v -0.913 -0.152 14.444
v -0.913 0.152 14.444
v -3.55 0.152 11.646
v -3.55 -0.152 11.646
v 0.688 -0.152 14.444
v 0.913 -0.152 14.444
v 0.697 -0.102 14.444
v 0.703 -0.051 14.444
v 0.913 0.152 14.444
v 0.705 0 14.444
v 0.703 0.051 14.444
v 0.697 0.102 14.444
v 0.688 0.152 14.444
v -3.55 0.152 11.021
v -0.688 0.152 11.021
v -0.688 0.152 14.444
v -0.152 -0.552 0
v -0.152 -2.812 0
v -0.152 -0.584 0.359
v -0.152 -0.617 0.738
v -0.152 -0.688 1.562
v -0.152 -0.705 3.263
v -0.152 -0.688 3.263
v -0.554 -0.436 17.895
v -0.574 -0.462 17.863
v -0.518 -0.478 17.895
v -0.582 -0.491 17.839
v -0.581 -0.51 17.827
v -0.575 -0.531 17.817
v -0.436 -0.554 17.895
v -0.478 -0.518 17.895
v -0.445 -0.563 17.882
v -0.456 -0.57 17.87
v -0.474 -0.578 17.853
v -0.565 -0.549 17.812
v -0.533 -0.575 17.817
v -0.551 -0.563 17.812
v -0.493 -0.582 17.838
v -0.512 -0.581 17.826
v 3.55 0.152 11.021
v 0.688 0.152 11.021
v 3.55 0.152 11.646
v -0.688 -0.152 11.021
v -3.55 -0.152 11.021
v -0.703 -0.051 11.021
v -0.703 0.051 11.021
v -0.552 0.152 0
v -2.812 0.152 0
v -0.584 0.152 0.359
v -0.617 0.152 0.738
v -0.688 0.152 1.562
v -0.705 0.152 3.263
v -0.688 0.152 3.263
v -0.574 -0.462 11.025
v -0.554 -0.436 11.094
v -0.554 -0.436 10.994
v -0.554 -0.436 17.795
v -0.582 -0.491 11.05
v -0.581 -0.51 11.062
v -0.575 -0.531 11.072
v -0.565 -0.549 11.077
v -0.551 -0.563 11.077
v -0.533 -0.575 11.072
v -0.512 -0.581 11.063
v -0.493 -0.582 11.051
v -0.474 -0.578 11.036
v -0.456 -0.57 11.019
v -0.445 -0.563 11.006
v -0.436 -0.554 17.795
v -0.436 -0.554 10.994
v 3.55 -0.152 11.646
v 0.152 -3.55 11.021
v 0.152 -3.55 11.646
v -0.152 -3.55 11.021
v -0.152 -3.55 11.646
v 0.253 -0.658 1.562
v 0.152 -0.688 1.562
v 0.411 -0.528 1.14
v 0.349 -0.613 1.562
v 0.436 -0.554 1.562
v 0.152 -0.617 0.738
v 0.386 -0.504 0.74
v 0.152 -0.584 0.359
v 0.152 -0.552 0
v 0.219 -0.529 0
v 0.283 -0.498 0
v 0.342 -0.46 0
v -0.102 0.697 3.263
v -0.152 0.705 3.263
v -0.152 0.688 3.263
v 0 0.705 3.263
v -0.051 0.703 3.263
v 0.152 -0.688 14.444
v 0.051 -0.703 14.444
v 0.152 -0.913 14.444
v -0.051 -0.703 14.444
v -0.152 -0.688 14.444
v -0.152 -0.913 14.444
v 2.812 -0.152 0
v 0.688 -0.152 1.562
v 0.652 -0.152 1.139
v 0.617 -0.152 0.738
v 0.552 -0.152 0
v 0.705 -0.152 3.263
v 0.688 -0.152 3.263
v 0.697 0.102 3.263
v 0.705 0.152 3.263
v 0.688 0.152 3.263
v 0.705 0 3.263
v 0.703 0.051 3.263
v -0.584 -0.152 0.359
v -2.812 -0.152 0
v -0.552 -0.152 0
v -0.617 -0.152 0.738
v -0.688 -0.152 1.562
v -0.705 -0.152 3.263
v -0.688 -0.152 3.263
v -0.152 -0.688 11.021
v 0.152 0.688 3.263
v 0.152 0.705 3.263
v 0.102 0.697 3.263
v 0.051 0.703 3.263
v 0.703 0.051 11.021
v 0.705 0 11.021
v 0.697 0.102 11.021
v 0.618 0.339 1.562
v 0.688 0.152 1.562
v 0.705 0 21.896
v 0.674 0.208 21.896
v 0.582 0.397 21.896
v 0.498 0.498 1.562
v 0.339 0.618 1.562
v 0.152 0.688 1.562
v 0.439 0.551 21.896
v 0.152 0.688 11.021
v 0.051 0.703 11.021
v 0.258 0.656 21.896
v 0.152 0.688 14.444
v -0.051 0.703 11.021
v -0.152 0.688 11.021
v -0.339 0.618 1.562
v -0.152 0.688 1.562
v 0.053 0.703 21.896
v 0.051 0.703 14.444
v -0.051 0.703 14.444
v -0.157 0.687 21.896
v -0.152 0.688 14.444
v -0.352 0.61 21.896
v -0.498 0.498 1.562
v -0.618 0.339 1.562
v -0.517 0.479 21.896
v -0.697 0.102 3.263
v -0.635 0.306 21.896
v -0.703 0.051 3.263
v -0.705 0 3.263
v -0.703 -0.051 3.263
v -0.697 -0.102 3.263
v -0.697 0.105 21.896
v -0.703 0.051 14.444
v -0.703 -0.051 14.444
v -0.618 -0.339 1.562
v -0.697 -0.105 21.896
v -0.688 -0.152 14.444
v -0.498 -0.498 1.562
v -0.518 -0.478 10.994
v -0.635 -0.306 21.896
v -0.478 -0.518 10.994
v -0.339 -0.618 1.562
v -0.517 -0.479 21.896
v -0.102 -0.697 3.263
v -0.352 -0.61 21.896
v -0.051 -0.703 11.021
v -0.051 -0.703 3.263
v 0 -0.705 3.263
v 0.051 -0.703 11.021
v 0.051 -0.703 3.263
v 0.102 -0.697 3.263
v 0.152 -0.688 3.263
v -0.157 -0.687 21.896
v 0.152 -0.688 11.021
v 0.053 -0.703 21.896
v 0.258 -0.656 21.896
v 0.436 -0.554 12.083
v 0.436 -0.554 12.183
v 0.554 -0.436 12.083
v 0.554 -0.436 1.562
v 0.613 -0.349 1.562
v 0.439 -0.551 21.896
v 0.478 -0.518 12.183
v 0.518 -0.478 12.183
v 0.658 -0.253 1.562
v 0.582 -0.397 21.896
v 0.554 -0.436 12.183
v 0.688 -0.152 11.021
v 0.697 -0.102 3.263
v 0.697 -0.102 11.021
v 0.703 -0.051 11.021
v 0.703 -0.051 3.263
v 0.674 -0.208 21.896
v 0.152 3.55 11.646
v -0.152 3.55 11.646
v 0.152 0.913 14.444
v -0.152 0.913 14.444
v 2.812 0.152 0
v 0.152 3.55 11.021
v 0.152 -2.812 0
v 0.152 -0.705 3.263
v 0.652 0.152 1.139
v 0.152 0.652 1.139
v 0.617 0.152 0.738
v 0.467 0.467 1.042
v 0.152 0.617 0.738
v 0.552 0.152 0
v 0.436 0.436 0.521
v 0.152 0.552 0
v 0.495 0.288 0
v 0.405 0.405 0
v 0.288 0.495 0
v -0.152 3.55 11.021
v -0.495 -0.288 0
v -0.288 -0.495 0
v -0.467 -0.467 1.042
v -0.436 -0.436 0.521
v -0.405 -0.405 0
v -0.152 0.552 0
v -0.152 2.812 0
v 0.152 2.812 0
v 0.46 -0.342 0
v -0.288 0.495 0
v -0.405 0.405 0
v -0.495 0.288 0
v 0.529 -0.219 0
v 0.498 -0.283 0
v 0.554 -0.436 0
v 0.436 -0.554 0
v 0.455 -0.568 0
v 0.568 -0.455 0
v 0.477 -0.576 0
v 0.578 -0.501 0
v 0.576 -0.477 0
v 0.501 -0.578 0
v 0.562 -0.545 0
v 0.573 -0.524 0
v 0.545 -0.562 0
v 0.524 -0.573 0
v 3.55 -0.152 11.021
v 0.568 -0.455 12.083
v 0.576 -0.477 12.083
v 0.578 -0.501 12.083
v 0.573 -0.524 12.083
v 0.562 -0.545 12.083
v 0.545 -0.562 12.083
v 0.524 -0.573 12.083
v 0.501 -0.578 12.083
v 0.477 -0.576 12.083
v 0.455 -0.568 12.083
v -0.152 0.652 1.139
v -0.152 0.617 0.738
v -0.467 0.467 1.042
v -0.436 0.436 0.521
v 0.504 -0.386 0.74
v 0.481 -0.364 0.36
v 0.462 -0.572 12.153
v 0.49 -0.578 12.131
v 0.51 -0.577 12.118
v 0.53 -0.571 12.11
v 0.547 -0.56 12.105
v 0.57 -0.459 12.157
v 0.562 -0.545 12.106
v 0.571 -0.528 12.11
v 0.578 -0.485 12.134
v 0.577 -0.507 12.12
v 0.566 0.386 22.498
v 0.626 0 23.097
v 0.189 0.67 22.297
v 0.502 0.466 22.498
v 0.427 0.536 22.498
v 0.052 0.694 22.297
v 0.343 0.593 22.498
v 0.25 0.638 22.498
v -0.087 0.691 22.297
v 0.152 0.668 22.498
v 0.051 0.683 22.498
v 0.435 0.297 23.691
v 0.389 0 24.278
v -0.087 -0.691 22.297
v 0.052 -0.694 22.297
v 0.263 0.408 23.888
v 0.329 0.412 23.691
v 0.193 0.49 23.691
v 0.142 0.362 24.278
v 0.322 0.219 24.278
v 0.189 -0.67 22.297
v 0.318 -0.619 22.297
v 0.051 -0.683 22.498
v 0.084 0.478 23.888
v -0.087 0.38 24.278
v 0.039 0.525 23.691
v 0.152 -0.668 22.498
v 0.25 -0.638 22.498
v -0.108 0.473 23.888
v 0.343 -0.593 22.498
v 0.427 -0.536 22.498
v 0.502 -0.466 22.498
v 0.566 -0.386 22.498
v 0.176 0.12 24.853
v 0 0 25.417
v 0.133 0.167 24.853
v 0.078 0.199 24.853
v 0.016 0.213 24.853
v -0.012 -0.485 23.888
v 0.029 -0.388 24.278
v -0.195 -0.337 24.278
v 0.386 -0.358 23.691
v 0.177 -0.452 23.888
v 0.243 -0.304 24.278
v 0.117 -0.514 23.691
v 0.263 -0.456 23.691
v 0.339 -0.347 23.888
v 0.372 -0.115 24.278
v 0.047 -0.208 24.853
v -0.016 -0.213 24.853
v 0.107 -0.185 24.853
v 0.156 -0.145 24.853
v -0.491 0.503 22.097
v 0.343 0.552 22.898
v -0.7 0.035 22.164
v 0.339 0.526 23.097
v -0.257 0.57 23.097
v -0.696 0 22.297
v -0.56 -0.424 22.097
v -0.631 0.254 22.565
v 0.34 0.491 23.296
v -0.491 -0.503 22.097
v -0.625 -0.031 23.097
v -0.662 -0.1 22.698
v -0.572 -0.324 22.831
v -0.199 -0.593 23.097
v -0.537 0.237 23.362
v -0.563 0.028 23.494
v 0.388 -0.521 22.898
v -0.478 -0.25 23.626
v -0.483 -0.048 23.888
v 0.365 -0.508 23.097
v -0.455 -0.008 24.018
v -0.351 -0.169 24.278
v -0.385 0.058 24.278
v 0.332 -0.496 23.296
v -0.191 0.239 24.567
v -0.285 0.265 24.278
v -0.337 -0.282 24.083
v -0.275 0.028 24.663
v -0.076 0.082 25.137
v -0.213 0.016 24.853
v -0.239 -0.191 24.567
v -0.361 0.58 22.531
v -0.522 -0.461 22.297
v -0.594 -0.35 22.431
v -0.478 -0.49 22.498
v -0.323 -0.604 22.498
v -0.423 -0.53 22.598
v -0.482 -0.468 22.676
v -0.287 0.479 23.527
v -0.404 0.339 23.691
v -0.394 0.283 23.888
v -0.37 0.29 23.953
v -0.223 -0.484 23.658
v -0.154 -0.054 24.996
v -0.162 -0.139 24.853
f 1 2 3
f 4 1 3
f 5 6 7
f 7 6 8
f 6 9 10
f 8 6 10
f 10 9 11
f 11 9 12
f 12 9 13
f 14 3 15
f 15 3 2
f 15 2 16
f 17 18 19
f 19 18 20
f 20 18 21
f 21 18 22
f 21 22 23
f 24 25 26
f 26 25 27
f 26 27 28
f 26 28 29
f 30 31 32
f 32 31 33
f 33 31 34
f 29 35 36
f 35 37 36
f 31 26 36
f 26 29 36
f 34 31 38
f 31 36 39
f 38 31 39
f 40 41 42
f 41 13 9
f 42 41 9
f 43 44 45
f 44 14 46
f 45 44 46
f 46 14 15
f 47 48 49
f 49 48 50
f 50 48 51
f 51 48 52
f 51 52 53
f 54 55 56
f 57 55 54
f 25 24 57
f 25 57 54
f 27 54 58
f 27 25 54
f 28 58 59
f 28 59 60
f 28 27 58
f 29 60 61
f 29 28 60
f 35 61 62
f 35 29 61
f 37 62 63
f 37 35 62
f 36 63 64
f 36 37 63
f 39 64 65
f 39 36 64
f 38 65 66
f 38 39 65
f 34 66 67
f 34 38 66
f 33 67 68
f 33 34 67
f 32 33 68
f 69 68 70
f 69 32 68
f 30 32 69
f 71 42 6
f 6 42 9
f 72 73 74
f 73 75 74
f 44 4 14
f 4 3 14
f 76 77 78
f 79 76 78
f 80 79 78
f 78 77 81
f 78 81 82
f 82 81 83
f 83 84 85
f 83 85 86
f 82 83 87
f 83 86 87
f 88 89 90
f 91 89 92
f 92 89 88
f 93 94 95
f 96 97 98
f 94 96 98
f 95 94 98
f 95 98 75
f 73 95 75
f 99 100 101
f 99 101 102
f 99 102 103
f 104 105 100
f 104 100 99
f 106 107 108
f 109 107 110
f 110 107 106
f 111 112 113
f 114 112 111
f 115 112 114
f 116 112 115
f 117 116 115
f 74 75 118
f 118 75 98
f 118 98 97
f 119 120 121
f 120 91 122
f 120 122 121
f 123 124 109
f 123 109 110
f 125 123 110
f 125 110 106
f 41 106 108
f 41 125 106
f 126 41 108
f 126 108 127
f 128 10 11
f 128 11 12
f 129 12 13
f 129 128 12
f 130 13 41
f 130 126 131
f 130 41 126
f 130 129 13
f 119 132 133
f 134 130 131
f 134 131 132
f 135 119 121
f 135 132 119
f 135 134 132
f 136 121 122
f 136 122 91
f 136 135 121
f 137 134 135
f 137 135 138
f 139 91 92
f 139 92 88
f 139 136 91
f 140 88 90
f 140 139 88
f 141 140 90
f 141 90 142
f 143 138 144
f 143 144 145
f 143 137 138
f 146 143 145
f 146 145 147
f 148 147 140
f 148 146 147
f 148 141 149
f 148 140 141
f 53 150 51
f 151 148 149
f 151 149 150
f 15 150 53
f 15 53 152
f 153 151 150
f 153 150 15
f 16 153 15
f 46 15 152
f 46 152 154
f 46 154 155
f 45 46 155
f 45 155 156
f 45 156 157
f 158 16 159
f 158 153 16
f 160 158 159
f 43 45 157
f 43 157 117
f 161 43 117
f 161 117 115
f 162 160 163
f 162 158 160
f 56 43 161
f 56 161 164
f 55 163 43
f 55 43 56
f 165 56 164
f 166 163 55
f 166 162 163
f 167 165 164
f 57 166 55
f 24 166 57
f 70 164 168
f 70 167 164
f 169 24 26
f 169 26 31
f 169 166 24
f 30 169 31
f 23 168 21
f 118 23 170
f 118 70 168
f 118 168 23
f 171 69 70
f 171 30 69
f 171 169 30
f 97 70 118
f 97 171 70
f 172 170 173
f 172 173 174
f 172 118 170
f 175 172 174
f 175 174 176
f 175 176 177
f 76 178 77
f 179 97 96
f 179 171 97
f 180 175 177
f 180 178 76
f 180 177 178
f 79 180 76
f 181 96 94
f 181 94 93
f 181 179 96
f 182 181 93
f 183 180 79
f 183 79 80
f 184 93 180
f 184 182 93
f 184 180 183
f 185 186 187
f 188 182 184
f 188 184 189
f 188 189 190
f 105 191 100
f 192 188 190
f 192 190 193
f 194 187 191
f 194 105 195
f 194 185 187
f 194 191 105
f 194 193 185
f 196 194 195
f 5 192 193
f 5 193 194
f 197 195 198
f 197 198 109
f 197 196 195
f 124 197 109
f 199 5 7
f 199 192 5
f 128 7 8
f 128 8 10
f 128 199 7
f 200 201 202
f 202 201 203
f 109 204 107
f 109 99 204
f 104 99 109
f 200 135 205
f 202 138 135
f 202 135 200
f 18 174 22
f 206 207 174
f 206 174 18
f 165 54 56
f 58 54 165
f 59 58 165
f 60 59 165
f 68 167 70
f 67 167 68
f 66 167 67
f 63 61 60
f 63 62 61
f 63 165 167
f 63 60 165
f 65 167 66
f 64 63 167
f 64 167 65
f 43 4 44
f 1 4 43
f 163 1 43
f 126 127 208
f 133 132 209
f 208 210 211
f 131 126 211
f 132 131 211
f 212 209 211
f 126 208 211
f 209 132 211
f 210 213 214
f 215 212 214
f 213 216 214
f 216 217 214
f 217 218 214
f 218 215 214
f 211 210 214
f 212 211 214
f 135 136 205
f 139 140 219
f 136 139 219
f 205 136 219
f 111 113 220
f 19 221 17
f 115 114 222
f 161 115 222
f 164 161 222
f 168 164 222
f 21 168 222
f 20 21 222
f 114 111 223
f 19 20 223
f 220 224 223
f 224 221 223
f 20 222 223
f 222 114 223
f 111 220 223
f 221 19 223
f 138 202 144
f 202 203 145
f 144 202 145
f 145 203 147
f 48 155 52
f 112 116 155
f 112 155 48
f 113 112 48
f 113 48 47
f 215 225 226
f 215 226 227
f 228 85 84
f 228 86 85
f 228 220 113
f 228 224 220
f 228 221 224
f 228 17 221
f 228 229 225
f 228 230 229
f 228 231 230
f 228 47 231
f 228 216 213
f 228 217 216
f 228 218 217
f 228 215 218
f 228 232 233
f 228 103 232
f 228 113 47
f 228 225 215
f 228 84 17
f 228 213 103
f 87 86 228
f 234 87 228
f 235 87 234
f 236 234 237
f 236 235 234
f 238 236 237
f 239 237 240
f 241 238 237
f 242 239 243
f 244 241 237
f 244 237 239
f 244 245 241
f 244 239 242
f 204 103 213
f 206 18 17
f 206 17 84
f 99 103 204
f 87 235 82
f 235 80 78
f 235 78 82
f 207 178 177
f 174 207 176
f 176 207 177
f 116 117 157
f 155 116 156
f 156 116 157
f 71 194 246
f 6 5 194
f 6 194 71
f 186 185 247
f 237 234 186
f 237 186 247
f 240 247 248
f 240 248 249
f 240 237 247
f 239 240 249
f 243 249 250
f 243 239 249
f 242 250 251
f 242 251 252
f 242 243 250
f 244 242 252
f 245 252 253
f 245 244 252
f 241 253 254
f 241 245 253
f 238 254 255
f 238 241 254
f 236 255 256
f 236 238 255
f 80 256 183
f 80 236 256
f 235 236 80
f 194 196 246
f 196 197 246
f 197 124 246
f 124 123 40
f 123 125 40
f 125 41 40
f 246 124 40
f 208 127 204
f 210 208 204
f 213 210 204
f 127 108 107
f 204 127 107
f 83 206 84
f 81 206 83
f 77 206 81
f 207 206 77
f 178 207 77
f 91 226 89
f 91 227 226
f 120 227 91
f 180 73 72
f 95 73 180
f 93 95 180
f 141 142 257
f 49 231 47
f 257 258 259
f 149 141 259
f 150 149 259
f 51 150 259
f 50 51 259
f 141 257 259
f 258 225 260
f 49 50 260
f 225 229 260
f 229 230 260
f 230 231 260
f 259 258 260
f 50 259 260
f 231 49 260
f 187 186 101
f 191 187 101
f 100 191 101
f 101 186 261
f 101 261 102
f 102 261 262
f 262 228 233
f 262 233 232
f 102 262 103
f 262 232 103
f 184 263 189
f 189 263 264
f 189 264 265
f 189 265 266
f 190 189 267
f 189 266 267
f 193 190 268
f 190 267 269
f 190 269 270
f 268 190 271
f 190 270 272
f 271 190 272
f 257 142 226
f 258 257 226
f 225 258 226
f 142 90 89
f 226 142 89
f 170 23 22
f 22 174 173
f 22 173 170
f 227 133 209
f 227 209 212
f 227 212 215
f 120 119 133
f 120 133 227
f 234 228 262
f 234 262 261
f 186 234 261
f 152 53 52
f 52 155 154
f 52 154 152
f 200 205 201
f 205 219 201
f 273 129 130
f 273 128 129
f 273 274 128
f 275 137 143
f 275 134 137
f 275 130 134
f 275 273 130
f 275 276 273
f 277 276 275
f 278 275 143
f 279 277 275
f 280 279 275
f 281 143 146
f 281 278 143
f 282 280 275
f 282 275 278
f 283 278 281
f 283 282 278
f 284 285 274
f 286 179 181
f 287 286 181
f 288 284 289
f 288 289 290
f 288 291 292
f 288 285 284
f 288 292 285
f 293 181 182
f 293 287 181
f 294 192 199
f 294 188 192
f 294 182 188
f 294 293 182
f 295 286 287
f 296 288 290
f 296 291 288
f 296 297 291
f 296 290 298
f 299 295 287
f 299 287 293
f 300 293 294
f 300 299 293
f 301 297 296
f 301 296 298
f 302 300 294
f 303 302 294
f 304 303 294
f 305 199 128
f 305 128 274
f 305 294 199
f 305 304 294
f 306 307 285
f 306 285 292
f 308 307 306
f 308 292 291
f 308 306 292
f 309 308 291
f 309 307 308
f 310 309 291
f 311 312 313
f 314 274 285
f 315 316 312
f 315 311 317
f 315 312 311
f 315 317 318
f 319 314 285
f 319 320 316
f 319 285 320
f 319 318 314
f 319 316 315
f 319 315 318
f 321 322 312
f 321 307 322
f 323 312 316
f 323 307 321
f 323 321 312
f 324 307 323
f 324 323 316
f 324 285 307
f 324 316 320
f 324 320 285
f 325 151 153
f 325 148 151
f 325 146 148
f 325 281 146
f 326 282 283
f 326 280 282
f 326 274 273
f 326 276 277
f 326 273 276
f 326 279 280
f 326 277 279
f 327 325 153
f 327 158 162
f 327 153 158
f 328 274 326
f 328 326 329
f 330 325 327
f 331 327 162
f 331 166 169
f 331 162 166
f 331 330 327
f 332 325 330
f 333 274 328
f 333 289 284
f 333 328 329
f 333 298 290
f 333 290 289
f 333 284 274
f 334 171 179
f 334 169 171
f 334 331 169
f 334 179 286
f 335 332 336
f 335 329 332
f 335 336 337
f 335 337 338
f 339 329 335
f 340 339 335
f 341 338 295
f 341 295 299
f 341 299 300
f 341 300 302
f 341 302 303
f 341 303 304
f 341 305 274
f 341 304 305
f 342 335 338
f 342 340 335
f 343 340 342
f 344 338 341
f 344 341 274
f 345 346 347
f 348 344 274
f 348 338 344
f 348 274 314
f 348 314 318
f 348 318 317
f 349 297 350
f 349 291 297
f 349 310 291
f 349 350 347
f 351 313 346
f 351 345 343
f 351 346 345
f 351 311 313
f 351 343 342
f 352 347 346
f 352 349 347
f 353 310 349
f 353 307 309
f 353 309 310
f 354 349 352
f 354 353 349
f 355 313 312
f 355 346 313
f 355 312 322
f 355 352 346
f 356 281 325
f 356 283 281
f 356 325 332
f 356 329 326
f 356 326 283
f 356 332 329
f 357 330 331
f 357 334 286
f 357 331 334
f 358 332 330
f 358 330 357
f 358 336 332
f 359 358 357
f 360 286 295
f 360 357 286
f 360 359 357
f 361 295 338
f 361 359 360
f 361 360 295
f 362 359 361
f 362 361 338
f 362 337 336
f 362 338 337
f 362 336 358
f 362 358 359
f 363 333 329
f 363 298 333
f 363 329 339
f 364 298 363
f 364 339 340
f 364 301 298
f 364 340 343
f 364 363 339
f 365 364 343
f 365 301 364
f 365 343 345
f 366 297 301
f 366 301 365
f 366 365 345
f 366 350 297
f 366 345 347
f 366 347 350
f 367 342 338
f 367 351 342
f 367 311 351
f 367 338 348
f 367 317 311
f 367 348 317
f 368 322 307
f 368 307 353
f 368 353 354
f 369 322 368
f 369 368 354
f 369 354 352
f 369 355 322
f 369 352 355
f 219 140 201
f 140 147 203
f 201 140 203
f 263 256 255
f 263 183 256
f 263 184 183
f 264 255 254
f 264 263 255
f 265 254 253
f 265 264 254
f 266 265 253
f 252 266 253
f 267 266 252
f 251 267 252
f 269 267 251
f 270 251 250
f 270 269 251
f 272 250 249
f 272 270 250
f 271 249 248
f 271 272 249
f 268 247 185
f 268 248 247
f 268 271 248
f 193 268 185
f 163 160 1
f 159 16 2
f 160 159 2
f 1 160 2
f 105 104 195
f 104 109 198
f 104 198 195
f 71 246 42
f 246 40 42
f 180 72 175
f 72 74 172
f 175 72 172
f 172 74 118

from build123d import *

# Parameters (mm, degrees)
F5_DEPTH      = 0.1524
F6_COUNT      = 4
F8_DEPTH      = 3.3506944444
F10_DEPTH     = 12.0833333333
F11_T4_ANGLE  = 55.3885988596
F11_S5_R      = 0.0834798304
F11_T6_DEPTH  = 2
F11_T10_ANGLE = 55.3885988596
F11_S11_R     = 0.0834798304
F11_T12_DEPTH = 2
F11_T16_ANGLE = 55.3885988596
F11_S17_R     = 0.0833333333
F11_T18_DEPTH = 2


# Not quite as in the source:
# - a fillet or chamfer that OpenCascade refuses, or shapes differently, is made with other operations: its cross-section is extruded or revolved along the edge and cut away or added


with BuildPart() as f1:
    # F0 (on Front) → F1 (revolve)
    with BuildSketch(Plane.XZ):
        with BuildLine():
            Line((0, 25.4166666667), (0, 0))
            Line((0, 0), (0.7048611111, 0))
            Line((0.7048611111, 0), (0.7048611111, 21.8958333333))
            ThreePointArc((0.7048611111, 21.8958333333), (0.5269147233, 23.6911812486), (0, 25.4166666667))
        make_face()
    revolve(axis=Axis((0, 0, 12.7083333333), (0, 0, 1)))

    # F2 (on Front) → F3 (revolve, cut)
    with BuildSketch(Plane.XZ):
        Polygon((0.7048611111, 1.5625), (0.5729166667, 0), (0.7048611111, 0), (1.5729166667, 0), (1.5729166667, 1.5625), align=None)
    revolve(axis=Axis((0, 0, 0), (0, 0, 1)), mode=Mode.SUBTRACT)

    # F4 (on Front) → F5 (join, symmetric)
    with BuildSketch(Plane.XZ):
        Polygon((0.7048611111, 14.4444444444), (-0.7048611111, 14.4444444444), (-0.9131944444, 14.4444444444), (-3.5498263889, 11.6464416667), (-3.5498263889, 11.0214416667), (-0.7048611111, 11.0214416667), (0.7048611111, 11.0214416667), (3.5498263889, 11.0214416667), (3.5498263889, 11.6464416667), (0.9131944444, 14.4444444444), align=None)
        Polygon((2.8125, 0), (0.7048611111, 3.2631944444), (-0.7048611111, 3.2631944444), (-2.8125, 0), (-0.1651, 0), (0.1651, 0), align=None)
    extrude(amount=F5_DEPTH, both=True)

    # F6: F1 ×4 about axis
    f6_axis = Axis((0, 0, 0), (0, 0, 1))


with BuildPart() as f1_1:
    add(f1.part)
    for i in range(1, F6_COUNT):
        add(f1.part.rotate(f6_axis, i * 360 / F6_COUNT))

    # F7 (on face) → F8 (join, symmetric)
    with BuildSketch(Plane.XY.offset(14.4444444444)):
        with BuildLine():
            ThreePointArc((-0.5538420942, -0.435990964), (-0.5574412256, -0.5574412256), (-0.435990964, -0.5538420942))
            ThreePointArc((-0.435990964, -0.5538420942), (-0.4984120715, -0.4984120715), (-0.5538420942, -0.435990964))
        make_face()
        with BuildLine():
            ThreePointArc((-0.5538420942, -0.435990964), (-0.4984120715, -0.4984120715), (-0.435990964, -0.5538420942))
            Line((-0.435990964, -0.5538420942), (-0.3224915619, -0.4403426921))
            Line((-0.3224915619, -0.4403426921), (-0.4403426921, -0.3224915619))
            Line((-0.4403426921, -0.3224915619), (-0.5538420942, -0.435990964))
        make_face()
    extrude(amount=F8_DEPTH, both=True)

    # F9 (on face) → F10 (join)
    with BuildSketch(Plane(origin=(0, 0, 0), x_dir=(1, 0, 0), z_dir=(0, 0, -1))):
        with BuildLine():
            ThreePointArc((0.435990964, 0.5538420942), (0.4984120715, 0.4984120715), (0.5538420942, 0.435990964))
            ThreePointArc((0.5538420942, 0.435990964), (0.5538420942, 0.5538420942), (0.435990964, 0.5538420942))
        make_face()
        with BuildLine():
            ThreePointArc((0.3418792892, 0.4597304194), (0.4051132601, 0.4051132601), (0.4597304194, 0.3418792892))
            Line((0.4597304194, 0.3418792892), (0.5538420942, 0.435990964))
            ThreePointArc((0.5538420942, 0.435990964), (0.4984120715, 0.4984120715), (0.435990964, 0.5538420942))
            Line((0.435990964, 0.5538420942), (0.3418792892, 0.4597304194))
        make_face()
    extrude(amount=-F10_DEPTH)

    # F11: chamfer of 0.1 on 3 edges, made by hand


with BuildPart() as f11_tool2:
    # F11_s3 → F11_t4 (revolve)
    with BuildSketch(Plane(origin=(0, 0, 0), x_dir=(0, 0, 1), z_dir=(-0.2974698653, 0.9547312078, 0))):
        Polygon((17.8951388889, -0.7048611111), (17.7951388889, -0.8048611111), (17.7951388889, -0.7048611111), align=None)
    revolve(axis=Axis((0, 0, 17.7951388889), (0, 0, 1)), revolution_arc=F11_T4_ANGLE)

    # F11_s5 → F11_t6 (intersect, symmetric)
    with BuildSketch(Plane.XY.offset(17.8)):
        with Locations((-0.4984120715, -0.4984120715)):
            Circle(F11_S5_R)
    extrude(amount=F11_T6_DEPTH, both=True, mode=Mode.INTERSECT)


with BuildPart() as f1_2:
    add(f1_1.part)

    # F11_t1: union F11_tool2
    add(f11_tool2.part)


with BuildPart() as f11_tool8:
    # F11_s9 → F11_t10 (revolve)
    with BuildSketch(Plane(origin=(0, 0, 0), x_dir=(0, 0, 1), z_dir=(-0.2974698653, 0.9547312078, 0))):
        Polygon((10.99375, -0.7048611111), (11.09375, -0.8048611111), (11.09375, -0.7048611111), align=None)
    revolve(axis=Axis((0, 0, 11.09375), (0, 0, 1)), revolution_arc=F11_T10_ANGLE)

    # F11_s11 → F11_t12 (intersect, symmetric)
    with BuildSketch(Plane.XY.offset(11)):
        with Locations((-0.4984120715, -0.4984120715)):
            Circle(F11_S11_R)
    extrude(amount=F11_T12_DEPTH, both=True, mode=Mode.INTERSECT)


with BuildPart() as f1_3:
    add(f1_2.part)

    # F11_t7: union F11_tool8
    add(f11_tool8.part)


with BuildPart() as f11_tool14:
    # F11_s15 → F11_t16 (revolve)
    with BuildSketch(Plane(origin=(0, 0, 0), x_dir=(0, 0, 1), z_dir=(-0.9547312078, -0.2974698653, 0))):
        Polygon((12.1833333333, -0.7048611111), (12.0833333333, -0.8048611111), (12.0833333333, -0.7048611111), align=None)
    revolve(axis=Axis((0, 0, 12.0833333333), (0, 0, 1)), revolution_arc=F11_T16_ANGLE)

    # F11_s17 → F11_t18 (intersect, symmetric)
    with BuildSketch(Plane.XY.offset(12.1)):
        with Locations((0.4949165291, -0.4949165291)):
            Circle(F11_S17_R)
    extrude(amount=F11_T18_DEPTH, both=True, mode=Mode.INTERSECT)


with BuildPart() as f1_4:
    add(f1_3.part)

    # F11_t13: union F11_tool14
    add(f11_tool14.part)


solid = f1_4.part
